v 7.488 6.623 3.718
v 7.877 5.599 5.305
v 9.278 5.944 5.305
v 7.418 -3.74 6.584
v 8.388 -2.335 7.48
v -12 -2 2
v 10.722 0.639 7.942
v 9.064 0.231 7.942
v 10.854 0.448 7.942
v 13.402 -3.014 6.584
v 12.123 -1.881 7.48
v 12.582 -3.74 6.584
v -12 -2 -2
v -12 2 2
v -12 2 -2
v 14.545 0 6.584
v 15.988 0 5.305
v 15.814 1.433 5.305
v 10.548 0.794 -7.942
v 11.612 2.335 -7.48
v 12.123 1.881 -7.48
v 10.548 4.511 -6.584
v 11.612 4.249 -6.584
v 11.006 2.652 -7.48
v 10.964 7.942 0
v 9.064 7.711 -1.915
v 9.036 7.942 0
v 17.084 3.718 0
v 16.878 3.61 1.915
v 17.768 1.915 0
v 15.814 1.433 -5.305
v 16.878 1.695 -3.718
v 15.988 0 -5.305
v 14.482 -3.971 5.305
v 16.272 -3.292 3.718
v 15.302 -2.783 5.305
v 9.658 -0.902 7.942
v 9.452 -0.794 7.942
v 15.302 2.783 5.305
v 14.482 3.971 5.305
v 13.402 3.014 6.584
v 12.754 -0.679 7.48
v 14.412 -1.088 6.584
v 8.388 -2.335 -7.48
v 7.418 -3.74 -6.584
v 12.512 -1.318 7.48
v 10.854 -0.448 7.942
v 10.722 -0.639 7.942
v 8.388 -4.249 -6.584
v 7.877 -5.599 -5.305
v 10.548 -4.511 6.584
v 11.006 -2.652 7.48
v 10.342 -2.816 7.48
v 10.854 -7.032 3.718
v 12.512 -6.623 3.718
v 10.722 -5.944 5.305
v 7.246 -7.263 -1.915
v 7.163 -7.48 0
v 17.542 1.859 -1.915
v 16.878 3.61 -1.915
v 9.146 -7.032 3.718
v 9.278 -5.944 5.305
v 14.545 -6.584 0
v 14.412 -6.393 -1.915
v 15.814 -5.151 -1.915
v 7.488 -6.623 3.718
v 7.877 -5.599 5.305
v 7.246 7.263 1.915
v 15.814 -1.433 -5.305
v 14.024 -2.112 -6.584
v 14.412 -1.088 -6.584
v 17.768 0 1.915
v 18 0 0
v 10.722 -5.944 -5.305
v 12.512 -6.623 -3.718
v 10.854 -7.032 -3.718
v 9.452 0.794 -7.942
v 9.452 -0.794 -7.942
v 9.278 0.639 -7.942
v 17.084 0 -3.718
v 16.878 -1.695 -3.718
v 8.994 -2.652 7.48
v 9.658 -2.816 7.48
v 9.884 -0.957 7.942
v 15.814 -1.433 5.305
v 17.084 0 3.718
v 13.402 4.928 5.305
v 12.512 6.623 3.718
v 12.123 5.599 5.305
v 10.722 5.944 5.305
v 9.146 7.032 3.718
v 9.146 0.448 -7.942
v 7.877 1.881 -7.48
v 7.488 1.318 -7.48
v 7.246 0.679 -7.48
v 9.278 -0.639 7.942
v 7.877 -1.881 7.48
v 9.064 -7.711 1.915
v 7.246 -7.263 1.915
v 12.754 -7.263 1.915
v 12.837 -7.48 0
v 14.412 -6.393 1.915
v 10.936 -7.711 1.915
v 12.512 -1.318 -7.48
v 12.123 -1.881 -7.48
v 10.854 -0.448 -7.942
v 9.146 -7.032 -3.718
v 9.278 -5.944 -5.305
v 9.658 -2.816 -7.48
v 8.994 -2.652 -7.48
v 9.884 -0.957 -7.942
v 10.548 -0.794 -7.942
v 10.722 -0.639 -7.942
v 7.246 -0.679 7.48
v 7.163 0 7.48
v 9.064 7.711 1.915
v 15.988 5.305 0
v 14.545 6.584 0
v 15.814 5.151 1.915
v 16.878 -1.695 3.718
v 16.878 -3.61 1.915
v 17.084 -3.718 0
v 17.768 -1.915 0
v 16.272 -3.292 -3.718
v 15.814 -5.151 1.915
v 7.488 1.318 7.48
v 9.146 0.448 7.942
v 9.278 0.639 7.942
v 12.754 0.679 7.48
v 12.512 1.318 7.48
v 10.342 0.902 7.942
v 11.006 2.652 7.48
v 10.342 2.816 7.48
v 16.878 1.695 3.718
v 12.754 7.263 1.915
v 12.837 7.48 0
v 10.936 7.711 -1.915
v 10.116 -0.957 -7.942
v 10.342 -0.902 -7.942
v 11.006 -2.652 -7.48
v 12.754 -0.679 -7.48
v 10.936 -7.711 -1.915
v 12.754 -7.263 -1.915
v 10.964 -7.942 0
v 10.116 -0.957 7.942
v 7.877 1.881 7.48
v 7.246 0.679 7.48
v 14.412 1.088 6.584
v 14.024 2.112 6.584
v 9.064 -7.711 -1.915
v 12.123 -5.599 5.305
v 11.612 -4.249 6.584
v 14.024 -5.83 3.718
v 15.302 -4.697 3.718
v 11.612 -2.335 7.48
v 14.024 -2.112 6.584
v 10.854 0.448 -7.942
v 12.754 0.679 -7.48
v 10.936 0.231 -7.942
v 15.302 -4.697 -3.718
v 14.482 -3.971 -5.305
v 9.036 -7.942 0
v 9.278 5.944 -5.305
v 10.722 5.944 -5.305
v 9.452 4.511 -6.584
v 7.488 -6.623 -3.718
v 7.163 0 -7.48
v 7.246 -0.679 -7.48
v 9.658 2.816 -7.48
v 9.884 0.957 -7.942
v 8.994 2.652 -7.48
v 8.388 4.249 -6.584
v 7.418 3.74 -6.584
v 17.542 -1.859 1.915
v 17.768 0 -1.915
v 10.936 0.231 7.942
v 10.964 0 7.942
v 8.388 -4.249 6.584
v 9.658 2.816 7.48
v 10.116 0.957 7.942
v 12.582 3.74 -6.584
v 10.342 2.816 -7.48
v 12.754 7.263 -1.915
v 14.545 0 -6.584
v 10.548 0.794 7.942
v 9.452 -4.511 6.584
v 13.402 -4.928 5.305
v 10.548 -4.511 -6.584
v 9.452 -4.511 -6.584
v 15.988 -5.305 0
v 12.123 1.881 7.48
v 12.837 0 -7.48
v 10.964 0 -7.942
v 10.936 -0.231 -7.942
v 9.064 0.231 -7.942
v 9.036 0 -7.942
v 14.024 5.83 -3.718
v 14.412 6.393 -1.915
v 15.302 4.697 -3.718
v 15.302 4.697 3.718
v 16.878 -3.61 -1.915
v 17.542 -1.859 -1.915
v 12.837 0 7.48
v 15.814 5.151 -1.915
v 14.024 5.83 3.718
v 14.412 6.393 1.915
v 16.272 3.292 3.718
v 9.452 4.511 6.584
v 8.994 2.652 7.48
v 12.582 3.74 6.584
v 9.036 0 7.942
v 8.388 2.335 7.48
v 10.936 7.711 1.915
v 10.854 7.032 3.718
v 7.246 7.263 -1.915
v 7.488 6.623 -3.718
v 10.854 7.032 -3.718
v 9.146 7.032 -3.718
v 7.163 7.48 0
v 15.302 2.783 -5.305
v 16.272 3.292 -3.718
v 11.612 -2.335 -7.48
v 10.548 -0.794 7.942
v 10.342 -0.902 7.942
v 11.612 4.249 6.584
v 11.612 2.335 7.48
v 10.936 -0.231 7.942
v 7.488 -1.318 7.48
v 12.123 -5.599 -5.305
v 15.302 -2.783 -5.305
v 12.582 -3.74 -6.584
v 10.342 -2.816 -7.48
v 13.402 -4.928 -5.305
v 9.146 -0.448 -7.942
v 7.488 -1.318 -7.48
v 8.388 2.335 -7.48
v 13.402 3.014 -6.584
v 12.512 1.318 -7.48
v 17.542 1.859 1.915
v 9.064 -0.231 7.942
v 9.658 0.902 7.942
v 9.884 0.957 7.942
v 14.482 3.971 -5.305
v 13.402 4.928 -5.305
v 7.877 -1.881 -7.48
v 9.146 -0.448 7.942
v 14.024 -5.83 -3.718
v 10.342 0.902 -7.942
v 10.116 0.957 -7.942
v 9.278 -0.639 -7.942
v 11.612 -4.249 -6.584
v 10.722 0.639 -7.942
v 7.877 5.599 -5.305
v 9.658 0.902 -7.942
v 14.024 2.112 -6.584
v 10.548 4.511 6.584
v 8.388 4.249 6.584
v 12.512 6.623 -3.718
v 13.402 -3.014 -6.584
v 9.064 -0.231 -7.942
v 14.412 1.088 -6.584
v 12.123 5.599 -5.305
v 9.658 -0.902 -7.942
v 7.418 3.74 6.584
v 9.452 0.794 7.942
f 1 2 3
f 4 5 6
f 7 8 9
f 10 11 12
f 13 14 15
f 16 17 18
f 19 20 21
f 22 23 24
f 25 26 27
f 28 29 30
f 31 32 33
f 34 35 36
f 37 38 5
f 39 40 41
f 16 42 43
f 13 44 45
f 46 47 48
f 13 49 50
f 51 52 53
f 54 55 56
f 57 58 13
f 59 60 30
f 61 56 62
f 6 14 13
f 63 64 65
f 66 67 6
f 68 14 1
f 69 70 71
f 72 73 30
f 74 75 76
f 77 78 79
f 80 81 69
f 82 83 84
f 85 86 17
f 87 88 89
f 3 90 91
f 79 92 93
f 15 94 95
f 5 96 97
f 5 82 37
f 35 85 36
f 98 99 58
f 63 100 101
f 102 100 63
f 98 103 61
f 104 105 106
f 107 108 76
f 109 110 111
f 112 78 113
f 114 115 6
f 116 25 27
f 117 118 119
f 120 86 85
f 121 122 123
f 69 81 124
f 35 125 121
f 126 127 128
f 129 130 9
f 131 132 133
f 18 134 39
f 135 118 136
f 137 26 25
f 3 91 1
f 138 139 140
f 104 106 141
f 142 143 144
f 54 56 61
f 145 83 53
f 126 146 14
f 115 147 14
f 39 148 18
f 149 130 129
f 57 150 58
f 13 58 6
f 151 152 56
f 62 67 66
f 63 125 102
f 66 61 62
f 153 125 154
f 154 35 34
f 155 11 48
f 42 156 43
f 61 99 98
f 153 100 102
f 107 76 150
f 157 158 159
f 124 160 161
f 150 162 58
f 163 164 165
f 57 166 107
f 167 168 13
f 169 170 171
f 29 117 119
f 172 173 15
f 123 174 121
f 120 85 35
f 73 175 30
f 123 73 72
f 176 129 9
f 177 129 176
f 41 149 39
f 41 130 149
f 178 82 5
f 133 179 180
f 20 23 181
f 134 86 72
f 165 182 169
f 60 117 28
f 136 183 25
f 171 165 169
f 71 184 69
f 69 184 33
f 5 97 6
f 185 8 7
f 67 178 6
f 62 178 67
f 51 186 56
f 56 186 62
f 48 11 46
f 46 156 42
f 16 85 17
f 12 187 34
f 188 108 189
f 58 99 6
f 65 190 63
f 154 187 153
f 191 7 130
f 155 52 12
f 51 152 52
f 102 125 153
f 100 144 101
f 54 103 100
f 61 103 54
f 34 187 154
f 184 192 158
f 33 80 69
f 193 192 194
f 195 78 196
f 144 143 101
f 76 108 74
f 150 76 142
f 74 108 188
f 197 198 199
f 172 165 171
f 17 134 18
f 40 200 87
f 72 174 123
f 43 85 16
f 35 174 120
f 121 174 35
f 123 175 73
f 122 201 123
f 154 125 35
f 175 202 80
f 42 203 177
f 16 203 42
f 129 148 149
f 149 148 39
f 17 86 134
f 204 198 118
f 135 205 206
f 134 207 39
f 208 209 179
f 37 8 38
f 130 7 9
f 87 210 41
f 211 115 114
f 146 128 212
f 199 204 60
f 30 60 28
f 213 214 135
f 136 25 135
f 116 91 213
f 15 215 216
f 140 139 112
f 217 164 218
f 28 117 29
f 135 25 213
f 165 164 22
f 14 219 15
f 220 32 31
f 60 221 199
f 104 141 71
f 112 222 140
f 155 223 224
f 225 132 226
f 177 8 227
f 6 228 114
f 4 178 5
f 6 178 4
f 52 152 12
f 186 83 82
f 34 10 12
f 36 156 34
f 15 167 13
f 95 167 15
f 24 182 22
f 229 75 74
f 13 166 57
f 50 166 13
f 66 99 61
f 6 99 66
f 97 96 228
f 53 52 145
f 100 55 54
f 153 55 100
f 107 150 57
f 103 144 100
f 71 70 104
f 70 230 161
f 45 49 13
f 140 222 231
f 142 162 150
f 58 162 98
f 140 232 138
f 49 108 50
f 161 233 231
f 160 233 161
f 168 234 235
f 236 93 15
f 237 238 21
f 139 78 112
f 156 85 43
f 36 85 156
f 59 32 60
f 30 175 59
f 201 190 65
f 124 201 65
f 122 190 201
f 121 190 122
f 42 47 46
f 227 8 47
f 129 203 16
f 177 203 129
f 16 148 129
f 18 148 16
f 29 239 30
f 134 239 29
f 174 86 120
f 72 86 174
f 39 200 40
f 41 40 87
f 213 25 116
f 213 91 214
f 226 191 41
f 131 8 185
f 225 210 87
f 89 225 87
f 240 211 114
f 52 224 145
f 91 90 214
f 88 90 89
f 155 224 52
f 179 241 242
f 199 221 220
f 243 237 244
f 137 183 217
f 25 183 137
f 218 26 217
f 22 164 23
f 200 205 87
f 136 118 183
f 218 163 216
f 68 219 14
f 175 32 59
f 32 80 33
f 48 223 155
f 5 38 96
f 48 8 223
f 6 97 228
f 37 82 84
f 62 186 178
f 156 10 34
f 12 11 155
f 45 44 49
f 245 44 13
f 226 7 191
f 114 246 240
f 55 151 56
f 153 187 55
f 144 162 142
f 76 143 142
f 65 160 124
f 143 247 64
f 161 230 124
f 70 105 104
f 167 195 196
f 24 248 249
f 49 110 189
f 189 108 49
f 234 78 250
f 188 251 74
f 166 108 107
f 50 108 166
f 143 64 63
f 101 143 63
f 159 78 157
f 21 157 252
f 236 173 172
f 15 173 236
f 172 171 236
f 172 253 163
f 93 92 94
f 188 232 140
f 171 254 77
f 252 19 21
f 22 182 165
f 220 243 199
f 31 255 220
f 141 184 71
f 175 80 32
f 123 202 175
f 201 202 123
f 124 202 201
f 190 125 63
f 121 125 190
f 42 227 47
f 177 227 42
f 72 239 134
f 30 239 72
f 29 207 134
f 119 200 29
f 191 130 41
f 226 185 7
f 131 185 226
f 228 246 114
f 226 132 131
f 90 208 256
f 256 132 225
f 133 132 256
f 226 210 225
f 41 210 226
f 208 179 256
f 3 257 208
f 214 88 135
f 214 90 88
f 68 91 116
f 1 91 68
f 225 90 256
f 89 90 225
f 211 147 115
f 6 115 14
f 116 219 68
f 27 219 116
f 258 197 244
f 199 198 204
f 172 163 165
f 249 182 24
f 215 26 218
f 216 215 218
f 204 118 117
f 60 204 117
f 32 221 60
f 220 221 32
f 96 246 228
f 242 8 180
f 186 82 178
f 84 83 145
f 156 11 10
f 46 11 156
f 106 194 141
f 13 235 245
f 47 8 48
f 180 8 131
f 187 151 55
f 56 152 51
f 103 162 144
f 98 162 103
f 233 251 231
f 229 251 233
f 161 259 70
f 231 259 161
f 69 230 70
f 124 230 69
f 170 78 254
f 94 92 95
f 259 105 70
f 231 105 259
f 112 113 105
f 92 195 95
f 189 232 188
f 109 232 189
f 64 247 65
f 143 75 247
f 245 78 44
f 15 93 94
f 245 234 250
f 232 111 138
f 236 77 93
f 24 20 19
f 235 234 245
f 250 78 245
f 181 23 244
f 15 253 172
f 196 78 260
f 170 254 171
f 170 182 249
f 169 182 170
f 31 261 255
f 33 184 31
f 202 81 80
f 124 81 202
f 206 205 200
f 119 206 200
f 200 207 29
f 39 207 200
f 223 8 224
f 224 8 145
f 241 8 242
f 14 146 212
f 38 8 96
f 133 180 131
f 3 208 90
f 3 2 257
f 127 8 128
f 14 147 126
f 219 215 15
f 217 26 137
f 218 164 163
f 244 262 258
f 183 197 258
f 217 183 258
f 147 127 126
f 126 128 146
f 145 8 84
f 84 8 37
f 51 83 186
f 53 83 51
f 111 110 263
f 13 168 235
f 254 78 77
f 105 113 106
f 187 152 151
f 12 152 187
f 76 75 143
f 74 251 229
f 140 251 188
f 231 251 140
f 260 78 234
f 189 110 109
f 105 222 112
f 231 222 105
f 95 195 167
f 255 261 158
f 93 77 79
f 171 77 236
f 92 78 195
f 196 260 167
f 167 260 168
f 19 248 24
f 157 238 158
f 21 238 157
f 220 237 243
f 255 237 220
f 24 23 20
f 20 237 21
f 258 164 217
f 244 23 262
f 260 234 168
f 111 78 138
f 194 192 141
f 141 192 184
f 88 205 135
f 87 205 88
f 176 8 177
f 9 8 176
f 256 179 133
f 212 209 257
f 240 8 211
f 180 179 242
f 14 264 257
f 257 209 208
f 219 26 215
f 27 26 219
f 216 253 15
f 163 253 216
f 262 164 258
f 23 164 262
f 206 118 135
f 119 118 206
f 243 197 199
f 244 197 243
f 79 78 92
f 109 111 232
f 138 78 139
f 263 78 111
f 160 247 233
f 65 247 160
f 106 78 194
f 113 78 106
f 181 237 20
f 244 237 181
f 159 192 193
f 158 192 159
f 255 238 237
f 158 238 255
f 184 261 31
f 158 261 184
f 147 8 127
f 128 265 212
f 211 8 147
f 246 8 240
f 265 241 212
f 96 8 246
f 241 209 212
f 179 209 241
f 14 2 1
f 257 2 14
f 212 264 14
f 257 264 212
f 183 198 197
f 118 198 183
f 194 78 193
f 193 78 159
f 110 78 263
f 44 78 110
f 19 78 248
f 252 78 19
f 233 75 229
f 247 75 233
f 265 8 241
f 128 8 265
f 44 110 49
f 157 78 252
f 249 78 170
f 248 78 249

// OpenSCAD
hull() {
    translate([10, 0, 0]) sphere(8);
    translate([-10, 0, 0]) cube([4, 4, 4], center=true);
}
